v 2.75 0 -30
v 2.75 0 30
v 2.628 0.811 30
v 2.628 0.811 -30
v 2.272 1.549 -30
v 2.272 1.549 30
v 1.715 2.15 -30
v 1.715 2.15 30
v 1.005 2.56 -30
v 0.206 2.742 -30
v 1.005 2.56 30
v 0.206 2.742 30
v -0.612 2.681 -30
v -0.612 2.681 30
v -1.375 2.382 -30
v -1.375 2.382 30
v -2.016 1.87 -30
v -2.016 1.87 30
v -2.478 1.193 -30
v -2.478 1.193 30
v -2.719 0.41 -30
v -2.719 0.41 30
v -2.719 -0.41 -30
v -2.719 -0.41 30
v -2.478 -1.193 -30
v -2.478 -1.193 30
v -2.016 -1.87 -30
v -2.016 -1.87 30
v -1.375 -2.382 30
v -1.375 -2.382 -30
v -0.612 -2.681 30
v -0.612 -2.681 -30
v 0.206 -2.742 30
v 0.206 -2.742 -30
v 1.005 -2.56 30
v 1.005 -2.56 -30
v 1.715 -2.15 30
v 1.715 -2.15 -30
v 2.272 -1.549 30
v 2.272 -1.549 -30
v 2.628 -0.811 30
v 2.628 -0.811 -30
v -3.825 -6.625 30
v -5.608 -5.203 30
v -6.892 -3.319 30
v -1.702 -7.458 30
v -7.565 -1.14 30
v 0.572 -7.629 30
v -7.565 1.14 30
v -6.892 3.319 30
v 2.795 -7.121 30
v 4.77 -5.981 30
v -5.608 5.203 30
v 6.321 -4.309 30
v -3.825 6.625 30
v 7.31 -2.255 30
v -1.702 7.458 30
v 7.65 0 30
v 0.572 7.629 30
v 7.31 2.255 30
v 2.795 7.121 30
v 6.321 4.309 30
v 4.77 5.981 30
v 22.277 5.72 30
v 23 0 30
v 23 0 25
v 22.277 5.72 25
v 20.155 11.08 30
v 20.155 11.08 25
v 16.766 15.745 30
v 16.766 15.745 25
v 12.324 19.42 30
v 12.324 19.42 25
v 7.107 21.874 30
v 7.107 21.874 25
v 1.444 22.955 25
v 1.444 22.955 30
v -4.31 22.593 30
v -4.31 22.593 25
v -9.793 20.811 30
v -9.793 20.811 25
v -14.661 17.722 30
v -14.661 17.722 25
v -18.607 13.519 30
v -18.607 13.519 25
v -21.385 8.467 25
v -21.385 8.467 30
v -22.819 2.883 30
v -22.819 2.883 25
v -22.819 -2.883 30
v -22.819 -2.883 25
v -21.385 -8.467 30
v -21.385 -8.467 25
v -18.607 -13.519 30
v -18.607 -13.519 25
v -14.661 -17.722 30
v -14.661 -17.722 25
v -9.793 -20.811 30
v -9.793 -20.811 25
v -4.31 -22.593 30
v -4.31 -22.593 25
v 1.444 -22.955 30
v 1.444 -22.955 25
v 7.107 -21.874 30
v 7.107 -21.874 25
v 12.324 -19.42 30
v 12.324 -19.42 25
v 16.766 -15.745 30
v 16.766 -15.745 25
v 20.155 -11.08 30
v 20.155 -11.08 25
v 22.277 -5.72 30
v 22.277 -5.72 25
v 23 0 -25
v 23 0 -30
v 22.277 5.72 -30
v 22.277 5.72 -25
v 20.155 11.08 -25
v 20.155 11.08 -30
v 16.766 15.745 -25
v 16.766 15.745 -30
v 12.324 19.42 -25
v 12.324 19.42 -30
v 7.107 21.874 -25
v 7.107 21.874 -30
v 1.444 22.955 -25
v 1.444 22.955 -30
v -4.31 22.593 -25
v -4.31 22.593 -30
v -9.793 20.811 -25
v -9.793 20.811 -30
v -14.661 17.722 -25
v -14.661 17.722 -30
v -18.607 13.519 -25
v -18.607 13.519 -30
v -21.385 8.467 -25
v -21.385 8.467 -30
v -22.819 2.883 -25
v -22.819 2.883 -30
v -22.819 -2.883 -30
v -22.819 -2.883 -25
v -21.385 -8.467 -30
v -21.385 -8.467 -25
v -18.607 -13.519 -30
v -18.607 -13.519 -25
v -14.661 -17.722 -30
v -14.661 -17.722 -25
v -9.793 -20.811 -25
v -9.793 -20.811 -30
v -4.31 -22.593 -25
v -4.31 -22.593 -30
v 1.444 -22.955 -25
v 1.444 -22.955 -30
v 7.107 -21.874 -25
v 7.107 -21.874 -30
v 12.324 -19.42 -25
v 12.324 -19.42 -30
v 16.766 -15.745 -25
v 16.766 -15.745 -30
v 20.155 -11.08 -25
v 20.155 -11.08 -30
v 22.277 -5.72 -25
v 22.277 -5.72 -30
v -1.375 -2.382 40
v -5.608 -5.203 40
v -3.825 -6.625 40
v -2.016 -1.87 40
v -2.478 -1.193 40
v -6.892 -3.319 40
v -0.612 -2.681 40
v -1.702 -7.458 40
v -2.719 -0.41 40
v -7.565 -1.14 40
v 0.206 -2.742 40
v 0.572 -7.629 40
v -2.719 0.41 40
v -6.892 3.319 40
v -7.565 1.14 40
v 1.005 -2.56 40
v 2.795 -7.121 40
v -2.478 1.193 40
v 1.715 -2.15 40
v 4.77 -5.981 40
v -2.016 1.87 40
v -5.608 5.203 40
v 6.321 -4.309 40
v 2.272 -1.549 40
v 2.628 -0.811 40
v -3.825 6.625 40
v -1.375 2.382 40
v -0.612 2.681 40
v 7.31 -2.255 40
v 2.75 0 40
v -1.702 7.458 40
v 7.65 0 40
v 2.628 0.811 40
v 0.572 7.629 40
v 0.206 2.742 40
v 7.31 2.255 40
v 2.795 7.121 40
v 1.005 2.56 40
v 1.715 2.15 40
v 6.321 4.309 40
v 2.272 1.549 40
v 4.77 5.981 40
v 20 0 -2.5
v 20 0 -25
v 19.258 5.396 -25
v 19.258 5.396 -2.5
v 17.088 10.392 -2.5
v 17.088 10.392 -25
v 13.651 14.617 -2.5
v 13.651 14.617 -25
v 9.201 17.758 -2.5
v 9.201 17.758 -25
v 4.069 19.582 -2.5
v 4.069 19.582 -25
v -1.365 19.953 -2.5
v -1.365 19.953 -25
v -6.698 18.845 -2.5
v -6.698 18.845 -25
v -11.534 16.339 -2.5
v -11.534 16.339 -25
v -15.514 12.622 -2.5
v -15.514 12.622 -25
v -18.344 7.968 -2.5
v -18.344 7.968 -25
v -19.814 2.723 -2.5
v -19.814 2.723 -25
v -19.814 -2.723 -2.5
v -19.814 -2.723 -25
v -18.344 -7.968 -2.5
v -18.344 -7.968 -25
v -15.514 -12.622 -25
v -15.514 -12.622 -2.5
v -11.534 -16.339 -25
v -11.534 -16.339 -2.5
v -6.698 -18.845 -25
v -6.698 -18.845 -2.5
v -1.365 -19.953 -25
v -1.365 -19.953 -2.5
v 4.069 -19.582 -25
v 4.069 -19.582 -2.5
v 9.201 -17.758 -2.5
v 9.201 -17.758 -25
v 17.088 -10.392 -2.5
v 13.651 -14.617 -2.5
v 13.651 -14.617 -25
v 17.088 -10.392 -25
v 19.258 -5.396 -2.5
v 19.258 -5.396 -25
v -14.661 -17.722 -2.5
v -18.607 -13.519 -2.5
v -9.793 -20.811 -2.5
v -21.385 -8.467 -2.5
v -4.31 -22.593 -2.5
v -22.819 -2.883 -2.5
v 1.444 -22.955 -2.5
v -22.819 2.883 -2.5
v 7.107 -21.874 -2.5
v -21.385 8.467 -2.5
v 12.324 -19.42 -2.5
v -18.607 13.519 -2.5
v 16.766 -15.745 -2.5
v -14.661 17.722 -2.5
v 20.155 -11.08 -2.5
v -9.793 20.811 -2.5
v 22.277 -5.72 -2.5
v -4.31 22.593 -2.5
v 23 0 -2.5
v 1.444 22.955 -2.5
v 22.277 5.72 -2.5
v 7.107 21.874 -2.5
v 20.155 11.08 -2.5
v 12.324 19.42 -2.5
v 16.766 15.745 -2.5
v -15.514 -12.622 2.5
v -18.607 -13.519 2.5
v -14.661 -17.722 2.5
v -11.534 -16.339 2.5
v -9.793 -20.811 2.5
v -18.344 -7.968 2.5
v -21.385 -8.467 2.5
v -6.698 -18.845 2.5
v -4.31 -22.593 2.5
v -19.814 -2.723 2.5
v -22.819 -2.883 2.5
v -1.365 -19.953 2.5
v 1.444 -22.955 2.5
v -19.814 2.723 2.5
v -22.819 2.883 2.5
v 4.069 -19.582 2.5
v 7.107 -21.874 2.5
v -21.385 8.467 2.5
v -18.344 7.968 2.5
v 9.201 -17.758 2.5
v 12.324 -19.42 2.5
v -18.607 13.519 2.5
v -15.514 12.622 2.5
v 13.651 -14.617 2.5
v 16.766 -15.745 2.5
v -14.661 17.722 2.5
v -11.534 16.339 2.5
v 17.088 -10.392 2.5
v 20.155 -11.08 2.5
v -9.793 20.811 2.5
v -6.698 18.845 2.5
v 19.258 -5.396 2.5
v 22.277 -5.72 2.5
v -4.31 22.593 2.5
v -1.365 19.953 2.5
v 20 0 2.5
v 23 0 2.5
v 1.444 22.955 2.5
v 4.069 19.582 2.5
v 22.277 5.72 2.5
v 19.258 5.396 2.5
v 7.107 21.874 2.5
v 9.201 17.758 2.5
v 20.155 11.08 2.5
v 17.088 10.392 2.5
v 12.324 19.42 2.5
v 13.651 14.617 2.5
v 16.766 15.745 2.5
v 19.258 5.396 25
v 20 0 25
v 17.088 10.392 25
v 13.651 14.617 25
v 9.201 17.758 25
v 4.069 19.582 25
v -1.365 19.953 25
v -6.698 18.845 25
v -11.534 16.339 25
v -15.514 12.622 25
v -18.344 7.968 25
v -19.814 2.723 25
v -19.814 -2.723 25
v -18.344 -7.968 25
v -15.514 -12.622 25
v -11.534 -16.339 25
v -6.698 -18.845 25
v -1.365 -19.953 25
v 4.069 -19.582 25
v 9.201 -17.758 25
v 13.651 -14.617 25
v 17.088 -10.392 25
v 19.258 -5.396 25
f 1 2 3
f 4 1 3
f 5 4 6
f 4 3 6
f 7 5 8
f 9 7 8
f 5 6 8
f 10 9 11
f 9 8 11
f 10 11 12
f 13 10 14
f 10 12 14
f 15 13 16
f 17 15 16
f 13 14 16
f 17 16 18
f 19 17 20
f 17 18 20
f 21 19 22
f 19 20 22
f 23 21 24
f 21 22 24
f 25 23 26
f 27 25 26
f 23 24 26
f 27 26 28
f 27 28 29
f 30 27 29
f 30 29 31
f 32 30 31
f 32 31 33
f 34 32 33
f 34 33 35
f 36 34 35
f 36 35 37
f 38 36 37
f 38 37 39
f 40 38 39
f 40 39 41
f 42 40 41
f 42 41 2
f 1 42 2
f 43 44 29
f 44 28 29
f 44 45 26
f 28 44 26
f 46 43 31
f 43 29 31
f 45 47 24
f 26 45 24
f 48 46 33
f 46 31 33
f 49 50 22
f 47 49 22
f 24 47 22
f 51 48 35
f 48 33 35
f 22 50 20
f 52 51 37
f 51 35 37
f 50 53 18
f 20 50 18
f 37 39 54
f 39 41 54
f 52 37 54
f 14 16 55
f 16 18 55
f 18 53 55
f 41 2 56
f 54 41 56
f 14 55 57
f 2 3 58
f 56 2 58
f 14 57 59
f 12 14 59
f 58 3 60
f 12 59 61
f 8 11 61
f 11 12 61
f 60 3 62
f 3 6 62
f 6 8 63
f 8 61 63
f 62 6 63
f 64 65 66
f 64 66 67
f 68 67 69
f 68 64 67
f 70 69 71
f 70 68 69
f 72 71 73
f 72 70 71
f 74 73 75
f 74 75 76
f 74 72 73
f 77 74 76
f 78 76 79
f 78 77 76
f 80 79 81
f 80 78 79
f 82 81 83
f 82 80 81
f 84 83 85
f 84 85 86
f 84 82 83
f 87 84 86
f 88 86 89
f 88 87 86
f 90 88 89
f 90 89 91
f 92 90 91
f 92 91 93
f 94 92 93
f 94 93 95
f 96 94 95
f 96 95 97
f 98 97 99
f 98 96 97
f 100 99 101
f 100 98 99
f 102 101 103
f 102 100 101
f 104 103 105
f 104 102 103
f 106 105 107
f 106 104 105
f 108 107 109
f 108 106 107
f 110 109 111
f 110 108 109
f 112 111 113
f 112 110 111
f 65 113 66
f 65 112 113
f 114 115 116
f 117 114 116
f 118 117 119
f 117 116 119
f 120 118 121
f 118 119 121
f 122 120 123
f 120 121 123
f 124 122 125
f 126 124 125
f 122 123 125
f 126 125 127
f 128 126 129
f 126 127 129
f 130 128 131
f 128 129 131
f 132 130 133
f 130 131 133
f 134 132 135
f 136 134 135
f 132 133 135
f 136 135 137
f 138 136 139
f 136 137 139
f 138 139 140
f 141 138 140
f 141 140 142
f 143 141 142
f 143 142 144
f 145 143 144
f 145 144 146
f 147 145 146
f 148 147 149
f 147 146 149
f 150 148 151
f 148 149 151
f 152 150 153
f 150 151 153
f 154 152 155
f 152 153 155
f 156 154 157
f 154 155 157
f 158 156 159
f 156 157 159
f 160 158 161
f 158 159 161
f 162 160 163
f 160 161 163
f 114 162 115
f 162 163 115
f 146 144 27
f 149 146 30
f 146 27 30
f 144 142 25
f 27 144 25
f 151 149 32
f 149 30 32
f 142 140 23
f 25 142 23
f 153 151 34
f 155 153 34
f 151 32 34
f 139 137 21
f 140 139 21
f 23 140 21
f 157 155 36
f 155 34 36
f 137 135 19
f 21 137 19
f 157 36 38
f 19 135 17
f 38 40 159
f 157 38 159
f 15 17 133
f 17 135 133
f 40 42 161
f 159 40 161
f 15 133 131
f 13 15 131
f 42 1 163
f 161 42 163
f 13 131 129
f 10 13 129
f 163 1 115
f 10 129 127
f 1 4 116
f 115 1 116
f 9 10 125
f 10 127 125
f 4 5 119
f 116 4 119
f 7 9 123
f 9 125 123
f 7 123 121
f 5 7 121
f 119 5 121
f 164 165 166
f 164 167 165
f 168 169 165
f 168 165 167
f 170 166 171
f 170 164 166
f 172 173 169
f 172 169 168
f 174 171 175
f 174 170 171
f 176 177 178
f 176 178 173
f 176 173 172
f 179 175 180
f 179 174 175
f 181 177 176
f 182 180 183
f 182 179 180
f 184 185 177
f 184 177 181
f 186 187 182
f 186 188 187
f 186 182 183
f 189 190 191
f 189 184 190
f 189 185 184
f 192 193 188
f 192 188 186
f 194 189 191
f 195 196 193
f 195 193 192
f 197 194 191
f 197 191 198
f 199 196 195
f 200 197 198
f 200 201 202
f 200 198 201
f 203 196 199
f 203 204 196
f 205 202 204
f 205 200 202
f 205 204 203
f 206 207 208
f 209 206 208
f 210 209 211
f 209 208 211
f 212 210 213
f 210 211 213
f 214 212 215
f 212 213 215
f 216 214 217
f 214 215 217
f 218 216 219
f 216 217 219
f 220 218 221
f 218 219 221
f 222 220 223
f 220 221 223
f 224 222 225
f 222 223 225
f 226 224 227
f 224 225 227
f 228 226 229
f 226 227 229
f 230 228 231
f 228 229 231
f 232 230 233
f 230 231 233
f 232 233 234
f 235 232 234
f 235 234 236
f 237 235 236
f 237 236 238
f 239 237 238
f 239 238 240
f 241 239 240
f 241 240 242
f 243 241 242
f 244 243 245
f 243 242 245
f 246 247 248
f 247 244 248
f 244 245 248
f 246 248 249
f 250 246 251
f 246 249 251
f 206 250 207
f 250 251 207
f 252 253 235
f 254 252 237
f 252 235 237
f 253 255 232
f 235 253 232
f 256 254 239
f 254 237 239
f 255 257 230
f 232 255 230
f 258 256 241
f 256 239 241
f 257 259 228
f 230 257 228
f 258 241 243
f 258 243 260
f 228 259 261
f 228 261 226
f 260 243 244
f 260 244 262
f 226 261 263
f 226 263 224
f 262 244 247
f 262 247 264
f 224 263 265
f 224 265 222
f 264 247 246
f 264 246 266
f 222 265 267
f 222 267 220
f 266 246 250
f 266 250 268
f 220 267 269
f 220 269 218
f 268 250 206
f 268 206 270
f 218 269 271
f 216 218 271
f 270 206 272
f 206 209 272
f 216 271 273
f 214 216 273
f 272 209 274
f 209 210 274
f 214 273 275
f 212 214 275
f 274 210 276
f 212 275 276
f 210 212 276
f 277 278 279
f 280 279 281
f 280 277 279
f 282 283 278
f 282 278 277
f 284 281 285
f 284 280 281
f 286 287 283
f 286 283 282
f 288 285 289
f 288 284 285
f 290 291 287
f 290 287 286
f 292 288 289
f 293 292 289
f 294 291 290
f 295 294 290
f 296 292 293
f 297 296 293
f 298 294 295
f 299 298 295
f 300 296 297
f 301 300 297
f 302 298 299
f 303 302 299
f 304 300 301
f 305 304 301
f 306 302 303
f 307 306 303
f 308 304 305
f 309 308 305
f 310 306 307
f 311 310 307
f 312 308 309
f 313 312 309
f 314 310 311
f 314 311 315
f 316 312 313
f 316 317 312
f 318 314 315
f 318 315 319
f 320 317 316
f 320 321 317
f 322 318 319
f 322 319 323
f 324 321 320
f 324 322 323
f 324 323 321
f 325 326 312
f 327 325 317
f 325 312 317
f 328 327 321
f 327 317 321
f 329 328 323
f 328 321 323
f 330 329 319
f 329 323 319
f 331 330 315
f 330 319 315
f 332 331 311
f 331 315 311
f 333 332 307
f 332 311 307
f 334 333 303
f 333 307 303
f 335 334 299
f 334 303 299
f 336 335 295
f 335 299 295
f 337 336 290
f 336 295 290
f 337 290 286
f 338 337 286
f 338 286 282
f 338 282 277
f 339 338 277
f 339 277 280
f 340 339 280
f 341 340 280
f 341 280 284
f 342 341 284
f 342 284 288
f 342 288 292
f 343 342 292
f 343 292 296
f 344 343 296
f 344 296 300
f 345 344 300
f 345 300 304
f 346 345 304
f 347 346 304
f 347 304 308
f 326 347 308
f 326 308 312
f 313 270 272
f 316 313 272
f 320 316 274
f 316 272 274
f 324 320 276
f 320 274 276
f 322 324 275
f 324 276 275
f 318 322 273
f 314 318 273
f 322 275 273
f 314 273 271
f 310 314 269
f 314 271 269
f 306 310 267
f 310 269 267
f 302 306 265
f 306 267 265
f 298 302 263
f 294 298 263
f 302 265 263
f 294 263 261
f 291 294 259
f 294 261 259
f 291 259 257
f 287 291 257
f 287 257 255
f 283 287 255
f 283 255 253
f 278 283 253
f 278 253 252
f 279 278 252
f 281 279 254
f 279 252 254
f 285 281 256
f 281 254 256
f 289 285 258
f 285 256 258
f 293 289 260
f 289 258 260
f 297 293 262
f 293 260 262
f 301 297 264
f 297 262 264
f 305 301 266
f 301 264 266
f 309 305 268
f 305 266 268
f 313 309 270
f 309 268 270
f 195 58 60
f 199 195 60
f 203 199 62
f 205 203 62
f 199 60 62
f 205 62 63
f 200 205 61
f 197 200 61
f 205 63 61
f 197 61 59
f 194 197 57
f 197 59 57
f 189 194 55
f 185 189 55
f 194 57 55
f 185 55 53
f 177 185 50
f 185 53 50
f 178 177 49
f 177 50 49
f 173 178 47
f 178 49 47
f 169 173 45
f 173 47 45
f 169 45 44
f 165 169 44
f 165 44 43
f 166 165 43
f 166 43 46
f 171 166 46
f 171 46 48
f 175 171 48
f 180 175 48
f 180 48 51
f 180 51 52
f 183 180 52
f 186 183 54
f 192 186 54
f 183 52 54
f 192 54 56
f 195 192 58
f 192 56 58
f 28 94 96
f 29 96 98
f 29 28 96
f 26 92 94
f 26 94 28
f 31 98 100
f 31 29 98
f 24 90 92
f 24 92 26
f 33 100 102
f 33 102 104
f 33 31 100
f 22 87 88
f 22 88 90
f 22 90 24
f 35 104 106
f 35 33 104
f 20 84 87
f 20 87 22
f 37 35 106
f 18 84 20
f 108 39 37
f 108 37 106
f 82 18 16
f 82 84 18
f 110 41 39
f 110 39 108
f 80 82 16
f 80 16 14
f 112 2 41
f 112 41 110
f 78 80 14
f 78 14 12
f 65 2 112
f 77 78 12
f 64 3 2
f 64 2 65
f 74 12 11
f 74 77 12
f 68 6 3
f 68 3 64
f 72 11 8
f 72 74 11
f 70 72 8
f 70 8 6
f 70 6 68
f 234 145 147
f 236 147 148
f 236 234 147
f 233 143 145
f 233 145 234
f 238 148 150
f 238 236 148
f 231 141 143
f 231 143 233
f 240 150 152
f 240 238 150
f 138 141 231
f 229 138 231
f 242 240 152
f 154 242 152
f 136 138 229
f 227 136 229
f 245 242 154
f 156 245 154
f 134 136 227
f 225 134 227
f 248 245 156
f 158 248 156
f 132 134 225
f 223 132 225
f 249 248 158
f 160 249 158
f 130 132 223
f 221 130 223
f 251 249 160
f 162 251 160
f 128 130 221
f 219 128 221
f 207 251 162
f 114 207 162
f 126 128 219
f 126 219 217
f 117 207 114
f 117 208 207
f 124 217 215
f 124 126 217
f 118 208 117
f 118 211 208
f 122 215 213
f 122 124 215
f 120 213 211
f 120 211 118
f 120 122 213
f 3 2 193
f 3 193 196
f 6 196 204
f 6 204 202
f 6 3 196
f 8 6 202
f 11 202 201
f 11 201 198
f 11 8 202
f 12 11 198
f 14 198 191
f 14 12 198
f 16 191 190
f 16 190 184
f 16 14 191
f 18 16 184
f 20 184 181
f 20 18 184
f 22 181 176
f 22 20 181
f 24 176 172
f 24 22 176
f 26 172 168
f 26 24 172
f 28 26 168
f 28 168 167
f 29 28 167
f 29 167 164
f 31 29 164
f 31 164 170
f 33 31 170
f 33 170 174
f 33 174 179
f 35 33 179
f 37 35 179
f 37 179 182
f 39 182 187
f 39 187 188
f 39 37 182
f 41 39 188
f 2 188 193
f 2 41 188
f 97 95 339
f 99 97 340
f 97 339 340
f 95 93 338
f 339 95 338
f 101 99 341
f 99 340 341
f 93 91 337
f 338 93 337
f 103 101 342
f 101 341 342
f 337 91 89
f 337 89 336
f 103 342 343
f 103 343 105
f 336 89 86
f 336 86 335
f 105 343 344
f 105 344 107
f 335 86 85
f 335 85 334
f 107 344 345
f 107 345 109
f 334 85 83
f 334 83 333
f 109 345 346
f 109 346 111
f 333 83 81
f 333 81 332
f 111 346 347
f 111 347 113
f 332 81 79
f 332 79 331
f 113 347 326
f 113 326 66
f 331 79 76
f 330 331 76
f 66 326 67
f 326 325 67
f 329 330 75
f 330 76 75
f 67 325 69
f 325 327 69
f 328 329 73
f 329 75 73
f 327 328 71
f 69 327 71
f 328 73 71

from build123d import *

# Parameters (mm, degrees)
BOSS_EXTRUDE1_DEPTH      = 2.5
BOSS_EXTRUDE1_DEPTH_BACK = 2.5
SKETCH1_R                = 23
BOSS_EXTRUDE2_DEPTH      = 30
BOSS_EXTRUDE2_DEPTH_BACK = 30
SKETCH3_R                = 20
SKETCH4_R                = 23
SKETCH4_R_2              = 20
BOSS_EXTRUDE3_DEPTH      = 5
SKETCH5_R                = 2.75
CUT_EXTRUDE1_DEPTH       = 69.249542123
SKETCH6_R                = 7.65
SKETCH6_R_2              = 2.75
BOSS_EXTRUDE4_DEPTH      = 10


with BuildPart() as part:
    # Sketch1 → Boss-Extrude1 (new, two sides: drawn at the far end of the back side and taken through both)
    with BuildSketch(Plane.XY.offset(-BOSS_EXTRUDE1_DEPTH_BACK)):
        Circle(SKETCH1_R)
    extrude(amount=BOSS_EXTRUDE1_DEPTH + BOSS_EXTRUDE1_DEPTH_BACK)

    # Sketch3 → Boss-Extrude2 (add, two sides: drawn at the far end of the back side and taken through both)
    with BuildSketch(Plane.XY.offset(-BOSS_EXTRUDE2_DEPTH_BACK)):
        Circle(SKETCH3_R)
    extrude(amount=BOSS_EXTRUDE2_DEPTH + BOSS_EXTRUDE2_DEPTH_BACK)

    # Sketch4 → Boss-Extrude3 (add)
    with BuildSketch(Plane.XY.offset(30)):
        Circle(SKETCH4_R)
        Circle(SKETCH4_R_2, mode=Mode.SUBTRACT)
    boss_extrude3 = extrude(amount=-BOSS_EXTRUDE3_DEPTH)

    # Mirror5: Boss-Extrude3 across plane
    add(boss_extrude3.mirror(Plane.XY))

    # Sketch5 → Cut-Extrude1 (cut, through all)
    with BuildSketch(Plane.XY.offset(30)):
        Circle(SKETCH5_R)
    extrude(amount=-CUT_EXTRUDE1_DEPTH, mode=Mode.SUBTRACT)


with BuildPart() as body_2:
    # Sketch6 → Boss-Extrude4 (new body)
    with BuildSketch(Plane.XY.offset(30)):
        Circle(SKETCH6_R)
        Circle(SKETCH6_R_2, mode=Mode.SUBTRACT)
    extrude(amount=BOSS_EXTRUDE4_DEPTH)


solid = Compound([part.part, body_2.part])
